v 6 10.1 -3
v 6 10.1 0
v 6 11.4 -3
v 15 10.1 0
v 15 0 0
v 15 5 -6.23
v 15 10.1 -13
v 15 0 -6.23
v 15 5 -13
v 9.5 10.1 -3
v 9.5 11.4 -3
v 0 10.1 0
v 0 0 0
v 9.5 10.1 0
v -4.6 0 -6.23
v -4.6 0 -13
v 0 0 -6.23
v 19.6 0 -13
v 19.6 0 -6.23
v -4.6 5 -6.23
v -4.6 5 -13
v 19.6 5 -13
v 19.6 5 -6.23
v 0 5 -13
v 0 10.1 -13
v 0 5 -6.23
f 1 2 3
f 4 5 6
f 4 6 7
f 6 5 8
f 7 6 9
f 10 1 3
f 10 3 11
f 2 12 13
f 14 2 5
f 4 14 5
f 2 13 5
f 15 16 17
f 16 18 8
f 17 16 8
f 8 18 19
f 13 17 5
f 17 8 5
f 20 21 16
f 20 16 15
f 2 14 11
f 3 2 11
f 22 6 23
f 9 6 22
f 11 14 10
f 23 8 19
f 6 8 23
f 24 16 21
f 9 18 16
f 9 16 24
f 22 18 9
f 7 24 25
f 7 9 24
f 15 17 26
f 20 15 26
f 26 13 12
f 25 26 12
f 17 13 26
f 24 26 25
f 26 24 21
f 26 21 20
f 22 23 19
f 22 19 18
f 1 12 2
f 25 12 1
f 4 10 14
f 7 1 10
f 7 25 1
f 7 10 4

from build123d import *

# Parameters (mm, degrees)
SKETCH1_W           = 15
SKETCH1_H           = 13
BOSS_EXTRUDE1_DEPTH = 10.1
SKETCH2_W           = 3.5
SKETCH2_H           = 3
BOSS_EXTRUDE2_DEPTH = 1.3
CUT_EXTRUDE1_REACH  = 21.728
SKETCH4_W           = 6.77
SKETCH4_H           = 5
BOSS_EXTRUDE3_DEPTH = 4.6
SKETCH5_W           = 6.77
SKETCH5_H           = 5
BOSS_EXTRUDE4_DEPTH = 4.6


with BuildPart() as part:
    # Sketch1 → Boss-Extrude1 (new body)
    with BuildSketch(Plane(origin=(0, 0, 0), x_dir=(1, 0, 0), z_dir=(0, 1, 0))):
        with Locations((7.5, 6.5)):
            Rectangle(SKETCH1_W, SKETCH1_H)
    extrude(amount=BOSS_EXTRUDE1_DEPTH)

    # Sketch2 → Boss-Extrude2 (add)
    with BuildSketch(Plane(origin=(0, 10.1, 0), x_dir=(1, 0, 0), z_dir=(0, 1, 0))):
        with Locations((7.75, 1.5)):
            Rectangle(SKETCH2_W, SKETCH2_H)
    extrude(amount=BOSS_EXTRUDE2_DEPTH)

    # Sketch3 → Cut-Extrude1 (cut, up to next)
    with BuildSketch(Plane(origin=(9.5, 0, 0), x_dir=(0, 0, -1), z_dir=(1, 0, 0)), mode=Mode.PRIVATE) as cut_extrude1_sk1:
        Polygon((0, 10.1), (3, 11.4), (0, 11.4), align=None)
    cut_extrude1_tool1 = extrude(cut_extrude1_sk1.sketch, amount=-CUT_EXTRUDE1_REACH, mode=Mode.PRIVATE) & part.part
    add(cut_extrude1_tool1.solids().sort_by_distance((9.5, 10.966667, -1))[0], mode=Mode.SUBTRACT)

    # Sketch4 → Boss-Extrude3 (add)
    with BuildSketch(Plane(origin=(15, 0, 0), x_dir=(0, 0, -1), z_dir=(1, 0, 0))):
        with Locations((9.615, 2.5)):
            Rectangle(SKETCH4_W, SKETCH4_H)
    extrude(amount=BOSS_EXTRUDE3_DEPTH)

    # Sketch5 → Boss-Extrude4 (add)
    with BuildSketch(Plane.ZY):
        with Locations((-9.615, 2.5)):
            Rectangle(SKETCH5_W, SKETCH5_H)
    extrude(amount=BOSS_EXTRUDE4_DEPTH)


solid = part.part
